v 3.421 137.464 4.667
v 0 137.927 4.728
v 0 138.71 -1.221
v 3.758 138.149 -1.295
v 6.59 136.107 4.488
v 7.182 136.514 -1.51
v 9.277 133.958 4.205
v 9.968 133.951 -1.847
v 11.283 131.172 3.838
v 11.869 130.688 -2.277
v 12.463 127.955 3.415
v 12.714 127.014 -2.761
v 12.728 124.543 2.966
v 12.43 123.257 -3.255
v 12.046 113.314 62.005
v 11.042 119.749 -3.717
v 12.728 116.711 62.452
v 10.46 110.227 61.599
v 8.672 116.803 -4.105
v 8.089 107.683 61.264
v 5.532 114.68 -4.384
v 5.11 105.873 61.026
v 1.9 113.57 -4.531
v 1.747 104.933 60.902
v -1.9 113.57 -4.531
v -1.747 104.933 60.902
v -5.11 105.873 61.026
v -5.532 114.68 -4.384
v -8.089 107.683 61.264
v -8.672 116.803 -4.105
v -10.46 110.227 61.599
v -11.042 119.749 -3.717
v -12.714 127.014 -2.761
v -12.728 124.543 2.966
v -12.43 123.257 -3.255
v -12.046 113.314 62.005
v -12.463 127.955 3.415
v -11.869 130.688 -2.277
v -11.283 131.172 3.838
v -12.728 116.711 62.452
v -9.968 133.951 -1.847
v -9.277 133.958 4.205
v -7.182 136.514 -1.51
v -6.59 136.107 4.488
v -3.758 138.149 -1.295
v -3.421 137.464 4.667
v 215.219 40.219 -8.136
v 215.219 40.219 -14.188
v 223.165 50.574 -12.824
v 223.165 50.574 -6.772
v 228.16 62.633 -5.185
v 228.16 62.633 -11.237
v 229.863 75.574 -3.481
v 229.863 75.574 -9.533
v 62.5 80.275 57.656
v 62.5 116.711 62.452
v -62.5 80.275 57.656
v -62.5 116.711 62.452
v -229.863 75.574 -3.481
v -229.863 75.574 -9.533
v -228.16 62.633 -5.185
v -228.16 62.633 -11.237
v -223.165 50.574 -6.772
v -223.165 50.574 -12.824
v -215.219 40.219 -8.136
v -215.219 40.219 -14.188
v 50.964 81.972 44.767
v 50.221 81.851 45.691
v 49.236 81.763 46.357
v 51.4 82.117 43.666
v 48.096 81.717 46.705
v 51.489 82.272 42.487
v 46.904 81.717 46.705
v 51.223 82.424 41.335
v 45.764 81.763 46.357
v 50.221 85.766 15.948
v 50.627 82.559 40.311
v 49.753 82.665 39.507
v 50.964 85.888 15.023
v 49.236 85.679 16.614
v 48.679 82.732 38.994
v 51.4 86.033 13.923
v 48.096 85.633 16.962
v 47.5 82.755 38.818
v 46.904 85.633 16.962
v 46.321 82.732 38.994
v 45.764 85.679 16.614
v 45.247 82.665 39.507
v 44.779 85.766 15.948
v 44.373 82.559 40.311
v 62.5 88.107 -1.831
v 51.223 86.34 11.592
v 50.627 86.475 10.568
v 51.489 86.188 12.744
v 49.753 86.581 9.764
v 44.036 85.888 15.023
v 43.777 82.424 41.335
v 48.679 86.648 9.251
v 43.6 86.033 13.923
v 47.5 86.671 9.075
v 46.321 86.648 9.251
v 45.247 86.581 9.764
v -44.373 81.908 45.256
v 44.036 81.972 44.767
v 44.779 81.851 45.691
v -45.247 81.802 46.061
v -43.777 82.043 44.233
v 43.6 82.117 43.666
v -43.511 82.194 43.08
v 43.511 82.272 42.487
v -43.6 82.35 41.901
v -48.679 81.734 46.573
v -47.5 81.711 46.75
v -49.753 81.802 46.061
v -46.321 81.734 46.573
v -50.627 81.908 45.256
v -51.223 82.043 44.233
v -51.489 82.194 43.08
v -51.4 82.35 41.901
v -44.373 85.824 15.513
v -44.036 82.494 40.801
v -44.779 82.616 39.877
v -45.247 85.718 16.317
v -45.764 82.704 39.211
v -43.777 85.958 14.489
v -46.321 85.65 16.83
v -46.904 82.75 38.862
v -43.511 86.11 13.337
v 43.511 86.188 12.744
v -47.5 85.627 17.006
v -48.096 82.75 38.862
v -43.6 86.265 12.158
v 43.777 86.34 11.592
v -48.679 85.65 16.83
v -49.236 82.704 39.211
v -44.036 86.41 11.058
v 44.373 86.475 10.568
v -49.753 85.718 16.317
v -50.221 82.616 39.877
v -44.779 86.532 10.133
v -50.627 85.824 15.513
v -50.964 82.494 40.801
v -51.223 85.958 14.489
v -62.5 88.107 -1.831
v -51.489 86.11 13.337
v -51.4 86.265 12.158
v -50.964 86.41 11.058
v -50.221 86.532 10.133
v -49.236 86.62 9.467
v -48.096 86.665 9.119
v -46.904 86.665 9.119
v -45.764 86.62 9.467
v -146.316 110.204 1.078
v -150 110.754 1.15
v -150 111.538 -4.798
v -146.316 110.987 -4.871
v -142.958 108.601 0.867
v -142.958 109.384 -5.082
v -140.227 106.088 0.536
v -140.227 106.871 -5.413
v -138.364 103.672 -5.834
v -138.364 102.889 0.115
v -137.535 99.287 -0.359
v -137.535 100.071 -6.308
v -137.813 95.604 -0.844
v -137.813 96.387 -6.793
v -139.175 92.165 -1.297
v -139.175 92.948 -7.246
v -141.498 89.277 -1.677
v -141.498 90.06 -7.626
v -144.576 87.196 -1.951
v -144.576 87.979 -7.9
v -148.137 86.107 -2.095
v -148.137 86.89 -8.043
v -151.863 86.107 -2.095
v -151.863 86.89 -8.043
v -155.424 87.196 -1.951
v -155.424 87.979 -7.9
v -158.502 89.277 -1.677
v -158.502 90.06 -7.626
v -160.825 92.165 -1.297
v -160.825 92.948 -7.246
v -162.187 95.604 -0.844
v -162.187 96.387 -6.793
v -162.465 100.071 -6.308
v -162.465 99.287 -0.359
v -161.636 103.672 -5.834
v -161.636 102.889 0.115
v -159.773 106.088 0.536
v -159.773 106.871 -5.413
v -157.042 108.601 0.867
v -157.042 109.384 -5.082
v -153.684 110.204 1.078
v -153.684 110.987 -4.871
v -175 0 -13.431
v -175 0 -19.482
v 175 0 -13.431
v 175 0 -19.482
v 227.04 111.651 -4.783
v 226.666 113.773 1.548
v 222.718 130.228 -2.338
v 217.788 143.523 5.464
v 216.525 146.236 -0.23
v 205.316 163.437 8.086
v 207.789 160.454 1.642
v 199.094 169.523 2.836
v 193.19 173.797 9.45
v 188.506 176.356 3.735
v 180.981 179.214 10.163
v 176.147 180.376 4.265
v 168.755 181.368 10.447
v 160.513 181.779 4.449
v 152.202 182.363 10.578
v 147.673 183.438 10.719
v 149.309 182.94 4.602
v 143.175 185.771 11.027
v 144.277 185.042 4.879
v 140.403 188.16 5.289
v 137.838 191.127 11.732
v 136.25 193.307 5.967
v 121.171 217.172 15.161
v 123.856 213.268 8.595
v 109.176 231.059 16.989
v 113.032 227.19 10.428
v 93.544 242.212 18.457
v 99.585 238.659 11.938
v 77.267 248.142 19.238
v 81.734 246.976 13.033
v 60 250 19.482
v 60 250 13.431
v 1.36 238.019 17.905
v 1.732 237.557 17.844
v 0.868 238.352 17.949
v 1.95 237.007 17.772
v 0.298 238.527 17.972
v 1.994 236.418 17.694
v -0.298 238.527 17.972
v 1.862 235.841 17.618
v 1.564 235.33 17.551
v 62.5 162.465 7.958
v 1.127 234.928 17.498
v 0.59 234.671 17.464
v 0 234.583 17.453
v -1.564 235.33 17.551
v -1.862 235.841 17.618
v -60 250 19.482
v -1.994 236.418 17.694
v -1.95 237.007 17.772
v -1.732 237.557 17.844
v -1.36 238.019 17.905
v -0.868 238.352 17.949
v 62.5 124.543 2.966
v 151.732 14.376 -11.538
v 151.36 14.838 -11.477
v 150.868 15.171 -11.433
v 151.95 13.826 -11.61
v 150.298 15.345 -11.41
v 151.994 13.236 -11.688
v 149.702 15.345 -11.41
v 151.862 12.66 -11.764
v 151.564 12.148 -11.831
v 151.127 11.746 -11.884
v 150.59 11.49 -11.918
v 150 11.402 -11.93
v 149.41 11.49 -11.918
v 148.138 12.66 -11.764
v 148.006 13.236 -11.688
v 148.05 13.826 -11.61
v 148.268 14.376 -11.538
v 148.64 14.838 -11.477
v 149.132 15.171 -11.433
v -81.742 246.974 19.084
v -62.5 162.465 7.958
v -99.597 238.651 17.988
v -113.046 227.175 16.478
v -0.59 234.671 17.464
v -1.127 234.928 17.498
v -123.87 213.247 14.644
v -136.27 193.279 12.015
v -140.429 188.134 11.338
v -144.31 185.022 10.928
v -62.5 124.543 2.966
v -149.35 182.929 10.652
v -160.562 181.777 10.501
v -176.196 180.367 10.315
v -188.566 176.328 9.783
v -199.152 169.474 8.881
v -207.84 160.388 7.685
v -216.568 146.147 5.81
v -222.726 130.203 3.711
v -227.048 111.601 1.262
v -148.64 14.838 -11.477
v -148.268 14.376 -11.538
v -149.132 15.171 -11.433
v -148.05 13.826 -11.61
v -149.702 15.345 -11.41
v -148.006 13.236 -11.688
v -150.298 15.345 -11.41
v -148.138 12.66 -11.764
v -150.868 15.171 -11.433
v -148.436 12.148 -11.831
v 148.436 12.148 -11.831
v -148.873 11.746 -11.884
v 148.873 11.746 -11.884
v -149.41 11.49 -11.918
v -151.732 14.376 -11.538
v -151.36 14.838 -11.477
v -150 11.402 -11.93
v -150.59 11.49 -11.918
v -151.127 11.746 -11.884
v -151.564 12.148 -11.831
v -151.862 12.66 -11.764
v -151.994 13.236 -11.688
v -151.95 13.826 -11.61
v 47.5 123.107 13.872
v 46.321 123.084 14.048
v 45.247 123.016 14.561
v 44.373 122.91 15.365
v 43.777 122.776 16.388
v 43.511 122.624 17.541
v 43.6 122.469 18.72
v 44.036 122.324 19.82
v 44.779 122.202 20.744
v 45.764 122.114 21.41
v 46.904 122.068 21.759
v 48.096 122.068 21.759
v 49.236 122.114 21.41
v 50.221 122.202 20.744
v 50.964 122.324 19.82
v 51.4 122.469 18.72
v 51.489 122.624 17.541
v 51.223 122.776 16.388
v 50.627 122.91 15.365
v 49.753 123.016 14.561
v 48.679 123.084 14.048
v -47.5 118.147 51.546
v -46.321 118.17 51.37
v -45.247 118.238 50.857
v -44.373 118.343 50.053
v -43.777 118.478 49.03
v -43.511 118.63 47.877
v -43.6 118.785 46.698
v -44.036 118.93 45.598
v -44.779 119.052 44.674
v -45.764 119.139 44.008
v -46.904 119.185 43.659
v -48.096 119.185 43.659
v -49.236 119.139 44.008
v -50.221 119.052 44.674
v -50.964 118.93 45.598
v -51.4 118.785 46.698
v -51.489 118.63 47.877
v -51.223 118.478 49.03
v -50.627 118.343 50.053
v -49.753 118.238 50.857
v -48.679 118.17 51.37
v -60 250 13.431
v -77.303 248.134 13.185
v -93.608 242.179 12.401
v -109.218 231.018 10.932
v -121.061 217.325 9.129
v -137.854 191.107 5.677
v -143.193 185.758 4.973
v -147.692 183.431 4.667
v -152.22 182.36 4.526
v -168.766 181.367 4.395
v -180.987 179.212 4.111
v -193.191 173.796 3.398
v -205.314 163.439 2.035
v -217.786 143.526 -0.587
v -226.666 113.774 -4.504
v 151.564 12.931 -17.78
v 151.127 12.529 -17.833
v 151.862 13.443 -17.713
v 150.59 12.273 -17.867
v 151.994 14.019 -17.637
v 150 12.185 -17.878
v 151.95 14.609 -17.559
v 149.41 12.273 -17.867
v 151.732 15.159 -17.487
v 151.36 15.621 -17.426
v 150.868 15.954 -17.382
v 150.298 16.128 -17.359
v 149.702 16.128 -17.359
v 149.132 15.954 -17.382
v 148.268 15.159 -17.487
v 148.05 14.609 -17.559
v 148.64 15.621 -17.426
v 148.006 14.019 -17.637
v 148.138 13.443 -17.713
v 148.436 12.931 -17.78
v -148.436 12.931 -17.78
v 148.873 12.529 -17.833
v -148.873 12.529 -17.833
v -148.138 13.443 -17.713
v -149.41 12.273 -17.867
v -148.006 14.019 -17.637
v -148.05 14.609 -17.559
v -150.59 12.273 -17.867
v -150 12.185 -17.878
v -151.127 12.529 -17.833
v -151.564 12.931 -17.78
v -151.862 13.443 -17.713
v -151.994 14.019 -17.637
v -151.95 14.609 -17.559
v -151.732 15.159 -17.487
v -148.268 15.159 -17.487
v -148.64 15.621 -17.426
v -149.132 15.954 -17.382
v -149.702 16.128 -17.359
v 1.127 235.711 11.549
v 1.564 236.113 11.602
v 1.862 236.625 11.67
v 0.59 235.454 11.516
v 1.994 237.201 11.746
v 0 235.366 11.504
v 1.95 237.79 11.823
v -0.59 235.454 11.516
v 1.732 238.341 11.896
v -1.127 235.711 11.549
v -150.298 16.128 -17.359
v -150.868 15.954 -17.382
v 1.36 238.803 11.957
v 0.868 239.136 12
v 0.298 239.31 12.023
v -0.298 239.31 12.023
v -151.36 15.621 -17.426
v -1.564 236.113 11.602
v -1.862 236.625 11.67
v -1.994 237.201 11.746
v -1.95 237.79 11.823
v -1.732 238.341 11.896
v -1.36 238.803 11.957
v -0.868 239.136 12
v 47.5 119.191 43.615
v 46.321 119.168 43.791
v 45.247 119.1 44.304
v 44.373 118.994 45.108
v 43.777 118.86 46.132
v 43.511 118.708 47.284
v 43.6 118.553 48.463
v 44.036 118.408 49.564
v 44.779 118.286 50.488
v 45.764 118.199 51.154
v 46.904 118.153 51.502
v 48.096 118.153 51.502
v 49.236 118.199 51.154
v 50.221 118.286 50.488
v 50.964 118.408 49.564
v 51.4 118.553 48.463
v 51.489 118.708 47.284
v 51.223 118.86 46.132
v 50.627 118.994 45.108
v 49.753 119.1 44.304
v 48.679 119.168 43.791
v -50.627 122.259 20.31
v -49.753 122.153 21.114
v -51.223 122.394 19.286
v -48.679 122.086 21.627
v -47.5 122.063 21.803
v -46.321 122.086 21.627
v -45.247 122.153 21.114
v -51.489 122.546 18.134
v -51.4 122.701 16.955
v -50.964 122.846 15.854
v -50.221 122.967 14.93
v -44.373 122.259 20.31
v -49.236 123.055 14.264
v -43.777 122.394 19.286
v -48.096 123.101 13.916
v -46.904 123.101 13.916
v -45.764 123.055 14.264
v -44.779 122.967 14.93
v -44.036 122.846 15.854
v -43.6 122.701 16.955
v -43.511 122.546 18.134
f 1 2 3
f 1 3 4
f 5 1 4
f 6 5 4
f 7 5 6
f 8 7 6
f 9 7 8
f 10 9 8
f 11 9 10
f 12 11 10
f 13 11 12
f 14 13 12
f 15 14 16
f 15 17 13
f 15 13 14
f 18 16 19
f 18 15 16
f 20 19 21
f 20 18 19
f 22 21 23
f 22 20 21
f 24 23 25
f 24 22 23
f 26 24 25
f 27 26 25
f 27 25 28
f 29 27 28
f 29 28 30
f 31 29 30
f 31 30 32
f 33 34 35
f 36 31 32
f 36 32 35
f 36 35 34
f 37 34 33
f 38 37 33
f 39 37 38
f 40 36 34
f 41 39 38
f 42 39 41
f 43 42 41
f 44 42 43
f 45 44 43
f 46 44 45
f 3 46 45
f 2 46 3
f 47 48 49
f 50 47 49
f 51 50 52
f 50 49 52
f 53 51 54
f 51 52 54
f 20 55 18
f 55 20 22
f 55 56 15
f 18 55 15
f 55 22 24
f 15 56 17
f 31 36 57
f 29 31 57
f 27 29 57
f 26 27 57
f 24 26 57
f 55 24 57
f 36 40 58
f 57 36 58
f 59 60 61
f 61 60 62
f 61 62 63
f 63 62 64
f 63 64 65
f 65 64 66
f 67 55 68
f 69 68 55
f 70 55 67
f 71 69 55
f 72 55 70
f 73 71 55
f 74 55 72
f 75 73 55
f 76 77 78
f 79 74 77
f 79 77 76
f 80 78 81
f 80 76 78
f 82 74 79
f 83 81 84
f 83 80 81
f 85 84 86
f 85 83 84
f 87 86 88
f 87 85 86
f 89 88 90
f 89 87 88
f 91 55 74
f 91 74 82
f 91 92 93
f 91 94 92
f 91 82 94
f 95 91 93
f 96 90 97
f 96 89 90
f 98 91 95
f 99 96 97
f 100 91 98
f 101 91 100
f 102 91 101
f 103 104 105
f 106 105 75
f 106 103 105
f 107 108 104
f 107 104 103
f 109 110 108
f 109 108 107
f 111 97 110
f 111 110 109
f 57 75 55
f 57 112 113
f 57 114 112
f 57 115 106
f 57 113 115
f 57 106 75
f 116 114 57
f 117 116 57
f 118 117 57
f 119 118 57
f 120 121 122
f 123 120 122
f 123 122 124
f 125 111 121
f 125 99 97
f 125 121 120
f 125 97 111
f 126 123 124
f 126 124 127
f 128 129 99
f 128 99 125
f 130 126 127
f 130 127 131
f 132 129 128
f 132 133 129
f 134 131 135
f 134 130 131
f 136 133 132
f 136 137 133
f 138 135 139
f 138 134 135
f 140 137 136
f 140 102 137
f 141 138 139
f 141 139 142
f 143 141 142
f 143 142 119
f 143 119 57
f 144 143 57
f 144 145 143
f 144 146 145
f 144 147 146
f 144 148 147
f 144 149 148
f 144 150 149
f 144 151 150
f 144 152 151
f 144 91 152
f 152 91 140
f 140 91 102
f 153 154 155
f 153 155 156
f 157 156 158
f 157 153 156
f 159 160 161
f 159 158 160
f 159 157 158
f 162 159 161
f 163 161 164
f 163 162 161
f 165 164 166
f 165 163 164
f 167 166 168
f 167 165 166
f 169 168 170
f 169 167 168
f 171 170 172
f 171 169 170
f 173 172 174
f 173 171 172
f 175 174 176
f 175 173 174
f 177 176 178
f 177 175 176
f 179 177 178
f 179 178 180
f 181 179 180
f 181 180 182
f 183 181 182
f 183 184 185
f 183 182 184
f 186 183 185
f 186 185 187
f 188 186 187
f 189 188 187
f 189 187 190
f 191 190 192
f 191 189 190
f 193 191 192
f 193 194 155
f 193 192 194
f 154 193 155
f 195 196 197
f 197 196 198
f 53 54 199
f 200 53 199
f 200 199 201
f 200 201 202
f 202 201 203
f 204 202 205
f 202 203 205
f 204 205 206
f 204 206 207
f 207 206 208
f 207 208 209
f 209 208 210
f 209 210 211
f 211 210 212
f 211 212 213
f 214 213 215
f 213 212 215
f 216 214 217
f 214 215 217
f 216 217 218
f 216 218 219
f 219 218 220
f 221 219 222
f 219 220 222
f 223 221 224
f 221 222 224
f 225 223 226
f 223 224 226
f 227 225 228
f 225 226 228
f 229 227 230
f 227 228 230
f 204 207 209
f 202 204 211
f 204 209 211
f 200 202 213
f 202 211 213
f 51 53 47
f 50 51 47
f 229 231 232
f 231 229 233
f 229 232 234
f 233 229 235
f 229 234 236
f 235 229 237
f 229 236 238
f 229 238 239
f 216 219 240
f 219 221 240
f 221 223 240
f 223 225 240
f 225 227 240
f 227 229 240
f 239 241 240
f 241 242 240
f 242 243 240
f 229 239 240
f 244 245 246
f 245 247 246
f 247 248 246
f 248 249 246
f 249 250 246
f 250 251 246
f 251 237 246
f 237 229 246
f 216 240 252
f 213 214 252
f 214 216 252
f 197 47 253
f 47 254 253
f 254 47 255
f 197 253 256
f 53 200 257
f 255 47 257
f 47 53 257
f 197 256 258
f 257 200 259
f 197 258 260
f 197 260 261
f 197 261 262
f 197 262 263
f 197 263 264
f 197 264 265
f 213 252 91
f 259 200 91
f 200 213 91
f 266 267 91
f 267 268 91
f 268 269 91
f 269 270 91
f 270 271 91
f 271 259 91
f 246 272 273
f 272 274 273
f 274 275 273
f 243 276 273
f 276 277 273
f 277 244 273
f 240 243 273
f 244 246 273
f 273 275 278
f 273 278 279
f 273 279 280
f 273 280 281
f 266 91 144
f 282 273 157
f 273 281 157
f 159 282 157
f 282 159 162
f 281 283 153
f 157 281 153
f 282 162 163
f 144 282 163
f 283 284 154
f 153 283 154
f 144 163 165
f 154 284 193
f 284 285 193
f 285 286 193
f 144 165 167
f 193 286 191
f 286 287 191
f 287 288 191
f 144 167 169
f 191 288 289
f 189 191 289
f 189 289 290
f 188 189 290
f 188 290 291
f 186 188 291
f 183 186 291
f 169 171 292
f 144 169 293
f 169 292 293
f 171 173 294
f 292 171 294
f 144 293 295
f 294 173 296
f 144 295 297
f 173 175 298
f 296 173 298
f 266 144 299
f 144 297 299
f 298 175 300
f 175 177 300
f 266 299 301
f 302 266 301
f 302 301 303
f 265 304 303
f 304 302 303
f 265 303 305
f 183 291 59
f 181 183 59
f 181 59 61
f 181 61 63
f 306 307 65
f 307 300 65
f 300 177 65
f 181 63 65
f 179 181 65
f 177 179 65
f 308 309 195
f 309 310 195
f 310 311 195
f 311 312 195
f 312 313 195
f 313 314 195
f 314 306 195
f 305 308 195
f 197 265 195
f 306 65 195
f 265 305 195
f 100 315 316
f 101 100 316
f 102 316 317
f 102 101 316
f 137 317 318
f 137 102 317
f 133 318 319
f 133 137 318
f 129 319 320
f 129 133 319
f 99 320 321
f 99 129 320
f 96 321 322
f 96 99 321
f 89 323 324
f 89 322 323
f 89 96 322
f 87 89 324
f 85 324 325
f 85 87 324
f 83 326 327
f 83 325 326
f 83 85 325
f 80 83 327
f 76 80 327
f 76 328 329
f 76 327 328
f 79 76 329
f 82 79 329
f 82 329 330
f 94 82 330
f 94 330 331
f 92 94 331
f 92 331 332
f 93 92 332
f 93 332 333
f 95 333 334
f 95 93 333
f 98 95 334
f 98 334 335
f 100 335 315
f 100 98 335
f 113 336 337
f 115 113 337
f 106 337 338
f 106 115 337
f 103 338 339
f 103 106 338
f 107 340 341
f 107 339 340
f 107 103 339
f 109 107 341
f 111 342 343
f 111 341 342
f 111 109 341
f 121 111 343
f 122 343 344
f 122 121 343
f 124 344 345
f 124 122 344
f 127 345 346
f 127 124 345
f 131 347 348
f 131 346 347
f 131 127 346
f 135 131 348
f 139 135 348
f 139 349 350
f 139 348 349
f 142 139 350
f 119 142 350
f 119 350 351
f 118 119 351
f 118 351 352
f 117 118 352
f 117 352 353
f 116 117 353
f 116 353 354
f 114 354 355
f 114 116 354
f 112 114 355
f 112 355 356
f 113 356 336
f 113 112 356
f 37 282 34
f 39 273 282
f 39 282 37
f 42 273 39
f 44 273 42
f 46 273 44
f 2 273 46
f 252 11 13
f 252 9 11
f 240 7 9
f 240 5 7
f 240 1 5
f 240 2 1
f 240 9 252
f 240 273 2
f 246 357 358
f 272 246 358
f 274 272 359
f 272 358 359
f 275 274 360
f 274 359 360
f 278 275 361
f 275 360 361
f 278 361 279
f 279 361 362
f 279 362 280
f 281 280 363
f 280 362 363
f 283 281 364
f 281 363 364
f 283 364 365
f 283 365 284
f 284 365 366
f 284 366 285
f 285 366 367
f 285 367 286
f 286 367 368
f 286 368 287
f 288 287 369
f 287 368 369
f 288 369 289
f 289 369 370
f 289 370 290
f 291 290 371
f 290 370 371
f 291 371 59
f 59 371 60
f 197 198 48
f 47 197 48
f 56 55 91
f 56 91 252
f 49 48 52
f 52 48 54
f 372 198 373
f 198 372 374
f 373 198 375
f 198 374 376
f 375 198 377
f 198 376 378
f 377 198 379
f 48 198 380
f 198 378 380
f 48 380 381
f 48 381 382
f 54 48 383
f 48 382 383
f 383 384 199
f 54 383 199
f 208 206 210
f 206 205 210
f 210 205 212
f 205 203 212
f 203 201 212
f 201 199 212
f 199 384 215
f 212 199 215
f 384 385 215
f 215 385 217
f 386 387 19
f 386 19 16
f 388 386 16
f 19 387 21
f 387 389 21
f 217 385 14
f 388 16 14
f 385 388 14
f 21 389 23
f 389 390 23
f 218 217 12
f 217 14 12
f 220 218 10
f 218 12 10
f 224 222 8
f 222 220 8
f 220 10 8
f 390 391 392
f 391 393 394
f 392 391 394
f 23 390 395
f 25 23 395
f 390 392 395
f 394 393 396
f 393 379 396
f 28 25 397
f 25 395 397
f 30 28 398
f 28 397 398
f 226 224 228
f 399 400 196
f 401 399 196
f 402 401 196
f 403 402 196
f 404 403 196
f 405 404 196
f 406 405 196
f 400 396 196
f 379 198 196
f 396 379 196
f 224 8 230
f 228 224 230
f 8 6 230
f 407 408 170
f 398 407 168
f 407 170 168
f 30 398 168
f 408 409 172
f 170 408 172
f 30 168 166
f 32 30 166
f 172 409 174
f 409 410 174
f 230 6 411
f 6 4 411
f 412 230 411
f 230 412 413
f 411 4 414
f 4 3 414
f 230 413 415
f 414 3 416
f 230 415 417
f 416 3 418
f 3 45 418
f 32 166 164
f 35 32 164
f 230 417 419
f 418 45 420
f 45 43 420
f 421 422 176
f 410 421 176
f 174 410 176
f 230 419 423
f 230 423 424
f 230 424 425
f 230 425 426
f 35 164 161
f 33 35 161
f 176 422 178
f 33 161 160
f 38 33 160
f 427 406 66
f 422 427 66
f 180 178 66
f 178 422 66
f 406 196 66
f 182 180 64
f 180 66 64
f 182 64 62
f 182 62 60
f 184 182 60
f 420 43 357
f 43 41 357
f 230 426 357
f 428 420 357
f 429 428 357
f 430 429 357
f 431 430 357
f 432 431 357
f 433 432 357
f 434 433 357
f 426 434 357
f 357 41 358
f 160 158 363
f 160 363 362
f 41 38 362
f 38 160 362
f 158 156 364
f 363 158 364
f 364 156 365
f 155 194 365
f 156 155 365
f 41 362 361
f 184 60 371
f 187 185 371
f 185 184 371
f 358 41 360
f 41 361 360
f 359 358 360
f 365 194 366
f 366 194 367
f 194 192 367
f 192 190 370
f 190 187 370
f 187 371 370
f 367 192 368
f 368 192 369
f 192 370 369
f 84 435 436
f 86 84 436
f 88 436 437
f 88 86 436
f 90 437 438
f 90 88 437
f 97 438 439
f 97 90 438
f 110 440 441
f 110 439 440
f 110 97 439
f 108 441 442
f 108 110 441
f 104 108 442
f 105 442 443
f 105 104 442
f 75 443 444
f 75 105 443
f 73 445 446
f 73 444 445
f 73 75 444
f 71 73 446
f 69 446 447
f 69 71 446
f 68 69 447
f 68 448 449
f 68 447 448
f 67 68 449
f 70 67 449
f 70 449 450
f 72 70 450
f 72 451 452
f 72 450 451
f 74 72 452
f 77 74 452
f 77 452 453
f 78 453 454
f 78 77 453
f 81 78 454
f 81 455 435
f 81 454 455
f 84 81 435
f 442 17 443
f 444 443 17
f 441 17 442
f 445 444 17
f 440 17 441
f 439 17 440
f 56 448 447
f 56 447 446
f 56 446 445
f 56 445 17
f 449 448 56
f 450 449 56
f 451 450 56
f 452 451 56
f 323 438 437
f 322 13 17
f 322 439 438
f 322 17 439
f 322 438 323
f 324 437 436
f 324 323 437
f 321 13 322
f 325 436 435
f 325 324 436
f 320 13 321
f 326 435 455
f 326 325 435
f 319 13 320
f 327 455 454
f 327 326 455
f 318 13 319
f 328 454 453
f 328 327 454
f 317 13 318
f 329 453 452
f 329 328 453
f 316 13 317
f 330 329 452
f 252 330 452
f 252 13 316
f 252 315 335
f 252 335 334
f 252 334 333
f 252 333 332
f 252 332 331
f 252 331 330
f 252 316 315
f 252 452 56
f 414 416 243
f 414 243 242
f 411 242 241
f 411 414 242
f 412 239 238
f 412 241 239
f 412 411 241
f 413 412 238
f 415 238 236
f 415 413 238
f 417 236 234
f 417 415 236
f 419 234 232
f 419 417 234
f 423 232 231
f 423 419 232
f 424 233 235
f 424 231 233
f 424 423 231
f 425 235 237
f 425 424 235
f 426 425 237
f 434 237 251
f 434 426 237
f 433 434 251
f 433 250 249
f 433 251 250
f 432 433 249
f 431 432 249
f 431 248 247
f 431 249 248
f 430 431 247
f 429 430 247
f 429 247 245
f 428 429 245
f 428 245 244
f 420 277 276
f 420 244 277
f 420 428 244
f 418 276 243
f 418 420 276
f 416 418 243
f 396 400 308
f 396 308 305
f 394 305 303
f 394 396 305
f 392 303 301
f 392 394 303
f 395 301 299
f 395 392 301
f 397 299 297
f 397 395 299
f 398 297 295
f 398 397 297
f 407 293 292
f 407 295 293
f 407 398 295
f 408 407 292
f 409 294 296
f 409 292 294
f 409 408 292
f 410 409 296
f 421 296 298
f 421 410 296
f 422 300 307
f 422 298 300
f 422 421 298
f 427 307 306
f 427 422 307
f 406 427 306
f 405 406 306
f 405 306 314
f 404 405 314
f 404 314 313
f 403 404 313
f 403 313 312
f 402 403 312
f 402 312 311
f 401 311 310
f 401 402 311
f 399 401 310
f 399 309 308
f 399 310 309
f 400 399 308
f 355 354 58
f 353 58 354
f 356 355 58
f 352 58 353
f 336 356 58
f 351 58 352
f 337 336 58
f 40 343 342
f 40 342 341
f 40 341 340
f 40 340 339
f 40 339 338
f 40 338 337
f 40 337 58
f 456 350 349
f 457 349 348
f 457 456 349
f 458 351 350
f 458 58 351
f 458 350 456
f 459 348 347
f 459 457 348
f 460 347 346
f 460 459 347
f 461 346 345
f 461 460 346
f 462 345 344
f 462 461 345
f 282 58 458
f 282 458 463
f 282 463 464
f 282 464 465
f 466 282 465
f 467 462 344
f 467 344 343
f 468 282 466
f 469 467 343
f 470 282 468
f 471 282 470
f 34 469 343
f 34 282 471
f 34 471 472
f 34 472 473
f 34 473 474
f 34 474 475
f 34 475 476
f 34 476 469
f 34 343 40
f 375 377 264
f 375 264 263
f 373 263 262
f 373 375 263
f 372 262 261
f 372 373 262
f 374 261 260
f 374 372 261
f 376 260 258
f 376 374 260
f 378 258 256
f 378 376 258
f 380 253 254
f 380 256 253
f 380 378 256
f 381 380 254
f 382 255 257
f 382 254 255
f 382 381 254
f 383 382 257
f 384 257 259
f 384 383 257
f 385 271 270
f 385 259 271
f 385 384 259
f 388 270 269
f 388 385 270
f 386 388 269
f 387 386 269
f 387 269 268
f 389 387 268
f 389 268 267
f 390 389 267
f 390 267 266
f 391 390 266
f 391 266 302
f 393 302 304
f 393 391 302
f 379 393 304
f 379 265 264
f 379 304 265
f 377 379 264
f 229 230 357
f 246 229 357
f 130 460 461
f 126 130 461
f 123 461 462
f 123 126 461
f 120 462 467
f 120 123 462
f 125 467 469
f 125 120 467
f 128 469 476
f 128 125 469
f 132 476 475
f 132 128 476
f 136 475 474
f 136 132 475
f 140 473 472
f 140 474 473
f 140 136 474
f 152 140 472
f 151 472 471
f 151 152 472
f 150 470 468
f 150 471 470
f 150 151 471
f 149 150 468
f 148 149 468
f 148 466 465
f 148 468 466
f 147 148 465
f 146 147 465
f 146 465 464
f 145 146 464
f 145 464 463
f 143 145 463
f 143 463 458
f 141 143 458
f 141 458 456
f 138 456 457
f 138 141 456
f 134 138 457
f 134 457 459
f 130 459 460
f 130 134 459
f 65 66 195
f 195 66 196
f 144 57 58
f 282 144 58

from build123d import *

# Parameters (mm, degrees)
EXTRUDE_START                                 = -25
EXTRUDE_PLATE_SHAPE_DEPTH                     = 50
CUT_EXTRUDE_ANGLE_DEPTH                       = 341.53226913
CUT_EXTRUDE_ANGLE_DEPTH_BACK                  = 341.53226913
CUT_EXTRUDE_SWITCH_HOLE_DEPTH                 = 340.963942654
CUT_EXTRUDE_SWITCH_HOLE_DEPTH_BACK            = 340.963942654
IGNITION_SWITCH_HOLE_R                        = 12.5
CUT_EXTRUDE_TOP_ENCLOSURE_HOLE_DEPTH          = 340.910991738
CUT_EXTRUDE_TOP_ENCLOSURE_HOLE_DEPTH_BACK     = 340.910991738
SKETCH23_R                                    = 2
CUT_EXTRUDE_BOTTOM_ENCLOSURE_HOLES_DEPTH      = 340.910991738
CUT_EXTRUDE_BOTTOM_ENCLOSURE_HOLES_DEPTH_BACK = 340.910991738
BOTTOM_ENCLOSURE_MOUNTING_HOLES_R             = 2
BOSS_EXTRUDE1_START                           = -6
SKETCH24_W                                    = 125
SKETCH24_H                                    = 75
BOSS_EXTRUDE1_DEPTH                           = 60
CUT_EXTRUDE_SHAFT_HOLE_DEPTH                  = 349.685760497
CUT_EXTRUDE_SHAFT_HOLE_DEPTH_BACK             = 349.685760497
STEERING_WHEEL_SHAFT_HOLE_R                   = 12.75
SKETCH26_W                                    = 456.008458956
SKETCH26_H                                    = 1.5
EXTRUDE_CUT_SLOT_DEPTH                        = 348.814796903
CUT_EXTRUDE17_DEPTH                           = 285.275916409
CUT_EXTRUDE17_DEPTH_BACK                      = 285.275916409
SKETCH28_R                                    = 4
CUT_EXTRUDE18_DEPTH                           = 351.351894744
CUT_EXTRUDE18_DEPTH_BACK                      = 60
SKETCH30_W                                    = 150
SKETCH30_H                                    = 50


# Read off the part's stored shape, not the designer's step: Extrude Plate Shape
with BuildPart() as part:
    # Extrude Plate Shape outline → Extrude Plate Shape (new body)
    with BuildSketch(Plane.XY.offset(EXTRUDE_START)):
        with BuildLine():
            Line((175, 0), (215.218833807, 40.218833807))
            ThreePointArc((215.218833807, 40.218833807), (226.057471223, 56.440000887), (229.863494748, 75.574172084))
            add(Edge.make_bspline(
                [(229.863494748, 75.574172084), (229.863497015, 220.574172084), (130.657195822, 208), (130.657198498, 108), (160, 250), (60, 250)],
                knots=[0, 0, 0, 0, 0, 0, 1, 1, 1, 1, 1, 1], degree=5))
            Line((60, 250), (-60, 250))
            add(Edge.make_bspline(
                [(-60, 250), (-160, 250), (-130.657198498, 108), (-130.657195822, 208), (-229.863497015, 220.574172084), (-229.863494748, 75.574172084)],
                knots=[0, 0, 0, 0, 0, 0, 1, 1, 1, 1, 1, 1], degree=5))
            ThreePointArc((-229.863494748, 75.574172084), (-226.057471223, 56.440000887), (-215.218833807, 40.218833807))
            Line((-215.218833807, 40.218833807), (-175, 0))
            Line((-175, 0), (175, 0))
        make_face()
    extrude(amount=EXTRUDE_PLATE_SHAPE_DEPTH)

    # 5-Degree Front Plate → Cut-Extrude Angle (cut, two sides: drawn at the far end of the back side and taken through both)
    with BuildSketch(Plane(origin=(0, 0, 0), x_dir=(0, 0, -1), z_dir=(1, 0, 0)).offset(-CUT_EXTRUDE_ANGLE_DEPTH_BACK)):
        Polygon((20.798974056, -10), (-14.747200293, 260), (35, 260), (35, -10), align=None)
        Polygon((-20.798974056, 260), (14.747200293, -10), (-35, -10), (-35, 260), align=None)
    extrude(amount=CUT_EXTRUDE_ANGLE_DEPTH + CUT_EXTRUDE_ANGLE_DEPTH_BACK, mode=Mode.SUBTRACT)

    # Ignition Switch Hole → Cut-Extrude Switch Hole (cut, two sides: drawn at the far end of the back side and taken through both)
    with BuildSketch(Plane(origin=(0, 2.521214434, -19.150524903), x_dir=(-1, 0, 0), z_dir=(0, 0.13052619222005532, -0.99144486137381)).offset(-CUT_EXTRUDE_SWITCH_HOLE_DEPTH_BACK)):
        with Locations(Location((150, 97.457030106, 0), (0, 0, 90))):
            Circle(IGNITION_SWITCH_HOLE_R)
    extrude(amount=CUT_EXTRUDE_SWITCH_HOLE_DEPTH + CUT_EXTRUDE_SWITCH_HOLE_DEPTH_BACK, mode=Mode.SUBTRACT)

    # Sketch23 → Cut-Extrude Top Enclosure Hole (cut, two sides: drawn at the far end of the back side and taken through both)
    with BuildSketch(Plane(origin=(0, 1.73805728, -13.201855735), x_dir=(1, 0, 0), z_dir=(0, -0.13052619222005535, 0.99144486137381)).offset(-CUT_EXTRUDE_TOP_ENCLOSURE_HOLE_DEPTH_BACK)):
        with Locations(Location((0, 236.854185237, 0), (0, 0, 270))):
            Circle(SKETCH23_R)
    extrude(amount=CUT_EXTRUDE_TOP_ENCLOSURE_HOLE_DEPTH + CUT_EXTRUDE_TOP_ENCLOSURE_HOLE_DEPTH_BACK, mode=Mode.SUBTRACT)

    # Bottom Enclosure Mounting Holes → Cut-Extrude Bottom Enclosure Holes (cut, two sides: drawn at the far end of the back side and taken through both)
    with BuildSketch(Plane(origin=(0, 1.73805728, -13.201855735), x_dir=(1, 0, 0), z_dir=(0, -0.13052619222005535, 0.99144486137381)).offset(-CUT_EXTRUDE_BOTTOM_ENCLOSURE_HOLES_DEPTH_BACK)):
        with Locations(Location((150, 11.746945092, 0), (0, 0, 270))):
            Circle(BOTTOM_ENCLOSURE_MOUNTING_HOLES_R)
        with Locations(Location((-150, 11.746945092, 0), (0, 0, 270))):
            Circle(BOTTOM_ENCLOSURE_MOUNTING_HOLES_R)
    extrude(amount=CUT_EXTRUDE_BOTTOM_ENCLOSURE_HOLES_DEPTH + CUT_EXTRUDE_BOTTOM_ENCLOSURE_HOLES_DEPTH_BACK, mode=Mode.SUBTRACT)

    # Sketch24 → Boss-Extrude1 (add)
    with BuildSketch(Plane(origin=(0, 2.521214434, -19.150524903), x_dir=(-1, 0, 0), z_dir=(0, 0.13052619222005538, -0.99144486137381)).offset(BOSS_EXTRUDE1_START)):
        with Locations((0, 124.614270251)):
            Rectangle(SKETCH24_W, SKETCH24_H)
    extrude(amount=-BOSS_EXTRUDE1_DEPTH)

    # Steering Wheel Shaft Hole → Cut-Extrude Shaft Hole (cut, two sides: drawn at the far end of the back side and taken through both)
    with BuildSketch(Plane(origin=(0, 2.521214434, -19.150524903), x_dir=(-1, 0, 0), z_dir=(0, 0.13052619222005532, -0.99144486137381)).offset(-CUT_EXTRUDE_SHAFT_HOLE_DEPTH_BACK)):
        with Locations(Location((0, 124.614270251, 0), (0, 0, 90))):
            Circle(STEERING_WHEEL_SHAFT_HOLE_R)
    extrude(amount=CUT_EXTRUDE_SHAFT_HOLE_DEPTH + CUT_EXTRUDE_SHAFT_HOLE_DEPTH_BACK, mode=Mode.SUBTRACT)

    # Sketch26 → Extrude-Cut Slot (cut, through all)
    with BuildSketch(Plane(origin=(0, 1.73805728, -13.201855735), x_dir=(1, 0, 0), z_dir=(0, -0.13052619222005535, 0.99144486137381))):
        with Locations((0, 124.614270251)):
            Rectangle(SKETCH26_W, SKETCH26_H)
    extrude(amount=EXTRUDE_CUT_SLOT_DEPTH, mode=Mode.SUBTRACT)

    # Sketch28 → Cut-Extrude17 (cut, two sides: drawn at the far end of the back side and taken through both)
    with BuildSketch(Plane(origin=(0, 160.727360196, 21.1601584), x_dir=(1, 0, 0), z_dir=(0, 0.99144486137381, 0.1305261922200554)).offset(-CUT_EXTRUDE17_DEPTH_BACK)):
        with Locations(Location((-47.5, -31.684225972, 0), (0, 0, 270))):
            Circle(SKETCH28_R)
        with Locations(Location((-47.5, -1.684225972, 0), (0, 0, 270))):
            Circle(SKETCH28_R)
        with Locations(Location((47.5, -31.684225972, 0), (0, 0, 90))):
            Circle(SKETCH28_R)
        with Locations(Location((47.5, -1.684225972, 0), (0, 0, 90))):
            Circle(SKETCH28_R)
    extrude(amount=CUT_EXTRUDE17_DEPTH + CUT_EXTRUDE17_DEPTH_BACK, mode=Mode.SUBTRACT)

    # Sketch30 → Cut-Extrude18 (cut, two sides: drawn at the far end of the back side and taken through both)
    with BuildSketch(Plane(origin=(0, -6.093514253, 46.284835948), x_dir=(1, 0, 0), z_dir=(0, -0.1305261922200554, 0.99144486137381)).offset(-CUT_EXTRUDE18_DEPTH_BACK)):
        with Locations((0, 149.614270251)):
            Rectangle(SKETCH30_W, SKETCH30_H)
    extrude(amount=CUT_EXTRUDE18_DEPTH + CUT_EXTRUDE18_DEPTH_BACK, mode=Mode.SUBTRACT)


solid = part.part
